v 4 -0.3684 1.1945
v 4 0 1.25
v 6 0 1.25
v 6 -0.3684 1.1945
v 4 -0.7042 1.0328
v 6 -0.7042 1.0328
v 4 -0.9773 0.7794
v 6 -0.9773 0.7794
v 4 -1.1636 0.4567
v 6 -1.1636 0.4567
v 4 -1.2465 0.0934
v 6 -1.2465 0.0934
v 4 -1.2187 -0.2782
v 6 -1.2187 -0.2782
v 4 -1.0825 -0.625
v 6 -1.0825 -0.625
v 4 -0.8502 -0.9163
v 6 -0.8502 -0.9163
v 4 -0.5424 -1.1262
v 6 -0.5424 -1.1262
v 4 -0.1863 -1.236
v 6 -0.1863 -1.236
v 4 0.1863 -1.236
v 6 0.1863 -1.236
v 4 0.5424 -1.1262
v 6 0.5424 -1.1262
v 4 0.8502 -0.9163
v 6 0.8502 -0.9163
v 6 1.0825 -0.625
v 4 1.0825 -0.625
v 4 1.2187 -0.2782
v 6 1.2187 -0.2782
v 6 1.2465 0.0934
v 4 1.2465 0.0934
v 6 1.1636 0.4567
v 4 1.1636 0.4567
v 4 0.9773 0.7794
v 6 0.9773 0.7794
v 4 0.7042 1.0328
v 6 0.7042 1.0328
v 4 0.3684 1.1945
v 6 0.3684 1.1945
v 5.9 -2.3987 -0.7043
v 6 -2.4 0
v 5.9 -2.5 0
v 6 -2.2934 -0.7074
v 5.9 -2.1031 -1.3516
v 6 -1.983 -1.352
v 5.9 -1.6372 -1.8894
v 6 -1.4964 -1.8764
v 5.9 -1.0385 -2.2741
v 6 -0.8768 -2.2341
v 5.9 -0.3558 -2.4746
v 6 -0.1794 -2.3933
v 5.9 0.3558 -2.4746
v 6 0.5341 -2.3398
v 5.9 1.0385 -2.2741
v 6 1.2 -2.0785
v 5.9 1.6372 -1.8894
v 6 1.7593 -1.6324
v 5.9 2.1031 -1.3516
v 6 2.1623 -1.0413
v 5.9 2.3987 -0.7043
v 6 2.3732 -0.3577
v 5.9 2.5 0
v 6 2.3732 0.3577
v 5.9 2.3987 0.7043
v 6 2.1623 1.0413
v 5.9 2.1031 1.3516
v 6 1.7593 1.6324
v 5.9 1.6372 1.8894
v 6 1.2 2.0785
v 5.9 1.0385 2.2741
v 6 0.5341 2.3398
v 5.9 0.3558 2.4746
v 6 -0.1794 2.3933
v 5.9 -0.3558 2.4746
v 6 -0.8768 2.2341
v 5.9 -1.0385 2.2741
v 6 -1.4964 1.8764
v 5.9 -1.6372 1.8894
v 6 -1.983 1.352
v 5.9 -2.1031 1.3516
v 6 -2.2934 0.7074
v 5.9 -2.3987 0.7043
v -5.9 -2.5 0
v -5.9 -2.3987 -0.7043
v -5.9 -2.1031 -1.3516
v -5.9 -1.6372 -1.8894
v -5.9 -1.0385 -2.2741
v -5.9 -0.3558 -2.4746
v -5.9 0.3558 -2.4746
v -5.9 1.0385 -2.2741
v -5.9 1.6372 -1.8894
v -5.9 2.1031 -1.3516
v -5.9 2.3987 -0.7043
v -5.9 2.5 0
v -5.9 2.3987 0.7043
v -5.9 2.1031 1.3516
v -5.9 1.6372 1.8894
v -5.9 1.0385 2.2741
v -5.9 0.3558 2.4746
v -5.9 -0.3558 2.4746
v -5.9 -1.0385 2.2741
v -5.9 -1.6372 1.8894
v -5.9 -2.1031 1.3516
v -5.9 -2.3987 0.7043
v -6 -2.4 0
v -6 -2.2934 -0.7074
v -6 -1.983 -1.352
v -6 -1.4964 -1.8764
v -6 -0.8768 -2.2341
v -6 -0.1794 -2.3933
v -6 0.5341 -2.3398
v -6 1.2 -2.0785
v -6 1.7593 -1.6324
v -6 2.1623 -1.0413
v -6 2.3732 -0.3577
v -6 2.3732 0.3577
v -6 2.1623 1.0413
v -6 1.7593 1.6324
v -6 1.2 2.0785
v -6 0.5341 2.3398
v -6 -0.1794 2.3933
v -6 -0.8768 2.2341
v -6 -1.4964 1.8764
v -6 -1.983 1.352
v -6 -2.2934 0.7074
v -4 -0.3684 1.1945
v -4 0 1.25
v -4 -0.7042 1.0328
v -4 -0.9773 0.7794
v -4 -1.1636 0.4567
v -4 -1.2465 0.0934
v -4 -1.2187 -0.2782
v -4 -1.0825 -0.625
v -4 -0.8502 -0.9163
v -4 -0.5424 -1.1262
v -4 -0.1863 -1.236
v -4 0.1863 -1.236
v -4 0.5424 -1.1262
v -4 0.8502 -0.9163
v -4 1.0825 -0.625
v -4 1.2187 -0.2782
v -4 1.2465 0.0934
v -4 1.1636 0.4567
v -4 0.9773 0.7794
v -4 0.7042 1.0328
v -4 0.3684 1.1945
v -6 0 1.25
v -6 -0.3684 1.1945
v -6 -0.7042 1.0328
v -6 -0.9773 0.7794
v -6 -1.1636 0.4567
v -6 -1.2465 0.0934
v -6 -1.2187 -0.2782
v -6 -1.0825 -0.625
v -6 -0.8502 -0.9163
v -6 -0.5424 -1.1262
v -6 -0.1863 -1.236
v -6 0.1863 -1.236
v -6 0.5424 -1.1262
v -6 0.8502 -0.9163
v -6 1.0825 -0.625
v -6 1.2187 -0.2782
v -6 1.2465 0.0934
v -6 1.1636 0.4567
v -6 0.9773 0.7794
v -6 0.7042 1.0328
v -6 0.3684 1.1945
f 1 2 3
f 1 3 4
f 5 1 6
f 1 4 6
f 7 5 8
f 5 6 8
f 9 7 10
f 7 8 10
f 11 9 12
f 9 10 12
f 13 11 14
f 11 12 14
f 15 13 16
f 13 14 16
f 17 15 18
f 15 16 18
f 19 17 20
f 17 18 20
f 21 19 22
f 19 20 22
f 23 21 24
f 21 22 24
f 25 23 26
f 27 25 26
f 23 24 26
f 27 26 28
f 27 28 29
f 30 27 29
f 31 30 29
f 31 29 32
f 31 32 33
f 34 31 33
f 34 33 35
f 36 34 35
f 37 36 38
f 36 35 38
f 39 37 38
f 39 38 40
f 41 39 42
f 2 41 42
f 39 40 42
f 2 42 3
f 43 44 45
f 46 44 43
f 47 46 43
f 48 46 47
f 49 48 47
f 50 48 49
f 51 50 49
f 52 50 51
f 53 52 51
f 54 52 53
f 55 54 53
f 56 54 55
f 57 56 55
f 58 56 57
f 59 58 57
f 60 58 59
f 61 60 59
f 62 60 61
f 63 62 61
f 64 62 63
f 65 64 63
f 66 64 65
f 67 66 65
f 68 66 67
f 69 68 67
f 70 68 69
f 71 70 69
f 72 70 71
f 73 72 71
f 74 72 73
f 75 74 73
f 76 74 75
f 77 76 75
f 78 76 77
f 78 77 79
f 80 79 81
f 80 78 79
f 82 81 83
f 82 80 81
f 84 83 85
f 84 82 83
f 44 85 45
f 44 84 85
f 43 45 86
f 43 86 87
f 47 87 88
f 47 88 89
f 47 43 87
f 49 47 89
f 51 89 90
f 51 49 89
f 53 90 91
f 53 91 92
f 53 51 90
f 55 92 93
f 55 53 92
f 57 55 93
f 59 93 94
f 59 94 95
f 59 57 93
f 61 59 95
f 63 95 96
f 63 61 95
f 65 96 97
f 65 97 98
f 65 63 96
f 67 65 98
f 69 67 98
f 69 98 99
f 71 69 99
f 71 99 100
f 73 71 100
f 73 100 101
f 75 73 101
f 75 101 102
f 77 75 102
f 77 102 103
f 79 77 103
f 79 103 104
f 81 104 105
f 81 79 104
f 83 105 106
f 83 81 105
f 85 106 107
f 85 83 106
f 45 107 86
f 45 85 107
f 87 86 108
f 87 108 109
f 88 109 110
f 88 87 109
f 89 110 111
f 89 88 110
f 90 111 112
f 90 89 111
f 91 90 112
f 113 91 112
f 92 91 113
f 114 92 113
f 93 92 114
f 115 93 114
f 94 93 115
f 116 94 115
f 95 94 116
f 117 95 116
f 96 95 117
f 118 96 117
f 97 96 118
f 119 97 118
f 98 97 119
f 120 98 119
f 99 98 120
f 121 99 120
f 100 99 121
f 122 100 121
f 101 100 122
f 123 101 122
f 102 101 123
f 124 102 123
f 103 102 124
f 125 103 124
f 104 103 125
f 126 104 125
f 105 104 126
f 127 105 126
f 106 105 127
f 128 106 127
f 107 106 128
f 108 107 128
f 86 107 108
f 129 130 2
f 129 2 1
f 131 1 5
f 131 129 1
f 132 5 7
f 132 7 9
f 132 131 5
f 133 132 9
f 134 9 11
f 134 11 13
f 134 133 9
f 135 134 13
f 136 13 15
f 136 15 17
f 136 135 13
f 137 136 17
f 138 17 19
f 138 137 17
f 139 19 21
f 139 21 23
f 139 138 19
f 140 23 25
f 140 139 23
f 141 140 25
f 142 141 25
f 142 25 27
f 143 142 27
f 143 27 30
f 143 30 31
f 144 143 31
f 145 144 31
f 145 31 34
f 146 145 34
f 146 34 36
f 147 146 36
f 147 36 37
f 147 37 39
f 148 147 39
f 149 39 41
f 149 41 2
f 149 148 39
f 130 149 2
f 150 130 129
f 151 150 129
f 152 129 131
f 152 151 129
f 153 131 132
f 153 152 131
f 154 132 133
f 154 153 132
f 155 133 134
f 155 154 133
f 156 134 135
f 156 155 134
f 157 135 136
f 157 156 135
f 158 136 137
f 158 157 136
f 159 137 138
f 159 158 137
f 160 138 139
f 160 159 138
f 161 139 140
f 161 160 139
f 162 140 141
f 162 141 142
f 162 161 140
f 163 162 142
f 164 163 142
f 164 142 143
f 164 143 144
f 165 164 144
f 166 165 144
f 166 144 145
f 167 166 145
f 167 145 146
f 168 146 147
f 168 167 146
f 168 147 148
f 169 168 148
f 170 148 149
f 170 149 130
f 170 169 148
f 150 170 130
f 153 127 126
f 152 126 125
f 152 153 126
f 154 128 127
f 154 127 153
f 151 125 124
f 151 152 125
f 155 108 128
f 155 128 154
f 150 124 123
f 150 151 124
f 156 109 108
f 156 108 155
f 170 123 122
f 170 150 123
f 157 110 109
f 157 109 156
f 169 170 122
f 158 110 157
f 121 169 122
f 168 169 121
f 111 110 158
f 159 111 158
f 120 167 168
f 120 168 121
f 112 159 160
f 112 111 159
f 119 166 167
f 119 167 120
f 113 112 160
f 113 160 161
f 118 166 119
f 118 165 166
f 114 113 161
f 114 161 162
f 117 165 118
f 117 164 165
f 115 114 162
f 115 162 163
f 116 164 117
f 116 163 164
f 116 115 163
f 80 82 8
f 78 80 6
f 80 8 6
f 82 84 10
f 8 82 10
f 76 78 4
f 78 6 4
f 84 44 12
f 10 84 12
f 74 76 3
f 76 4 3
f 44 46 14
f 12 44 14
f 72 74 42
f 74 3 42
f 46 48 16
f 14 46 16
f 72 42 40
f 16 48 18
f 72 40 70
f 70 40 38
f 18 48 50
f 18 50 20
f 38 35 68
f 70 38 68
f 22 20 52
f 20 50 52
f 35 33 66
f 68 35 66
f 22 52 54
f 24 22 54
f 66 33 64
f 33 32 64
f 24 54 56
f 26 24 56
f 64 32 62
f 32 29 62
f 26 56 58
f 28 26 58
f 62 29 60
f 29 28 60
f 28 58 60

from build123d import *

# Parameters (mm, degrees)
SKETCH_1_W     = 12
SKETCH_1_H     = 2.5
CHAMFER_1_SIZE = 0.1


with BuildPart() as part:
    # 草图1 → 旋转1 (revolve)
    with BuildSketch(Plane.XY, mode=Mode.PRIVATE) as revolve_1_sk:
        with Locations((0, 1.25)):
            Rectangle(SKETCH_1_W, SKETCH_1_H)
    revolve(revolve_1_sk.sketch.rotate(Axis((-6, 0, 0), (1, 0, 0)), 180), axis=Axis((-6, 0, 0), (1, 0, 0)))

    # 草图3 → Hole Wizard 378 (revolve, cut)
    with BuildSketch(Plane(origin=(-6, 0, 0), x_dir=(0, 0, 1), z_dir=(0, 1, 0))):
        Polygon((0, 0), (0, 10.751075774), (1.25, 10), (1.25, 0), align=None)
    hole_wizard_378 = revolve(axis=Axis((-12.35, 0, 0), (1, 0, 0)), mode=Mode.SUBTRACT)

    # 镜向1: Hole Wizard 378 across plane
    add(hole_wizard_378.mirror(Plane(origin=(0, 0, 0), x_dir=(0, 0, 1), z_dir=(1, 0, 0))), mode=Mode.SUBTRACT)

    # 倒角1
    chamfer_1_edges = [part.edges().sort_by_distance(p)[0] for p in [
        (-6, 2.5, 0),
        (6, 2.5, 0),
    ]]
    chamfer(chamfer_1_edges, length=CHAMFER_1_SIZE)


solid = part.part
